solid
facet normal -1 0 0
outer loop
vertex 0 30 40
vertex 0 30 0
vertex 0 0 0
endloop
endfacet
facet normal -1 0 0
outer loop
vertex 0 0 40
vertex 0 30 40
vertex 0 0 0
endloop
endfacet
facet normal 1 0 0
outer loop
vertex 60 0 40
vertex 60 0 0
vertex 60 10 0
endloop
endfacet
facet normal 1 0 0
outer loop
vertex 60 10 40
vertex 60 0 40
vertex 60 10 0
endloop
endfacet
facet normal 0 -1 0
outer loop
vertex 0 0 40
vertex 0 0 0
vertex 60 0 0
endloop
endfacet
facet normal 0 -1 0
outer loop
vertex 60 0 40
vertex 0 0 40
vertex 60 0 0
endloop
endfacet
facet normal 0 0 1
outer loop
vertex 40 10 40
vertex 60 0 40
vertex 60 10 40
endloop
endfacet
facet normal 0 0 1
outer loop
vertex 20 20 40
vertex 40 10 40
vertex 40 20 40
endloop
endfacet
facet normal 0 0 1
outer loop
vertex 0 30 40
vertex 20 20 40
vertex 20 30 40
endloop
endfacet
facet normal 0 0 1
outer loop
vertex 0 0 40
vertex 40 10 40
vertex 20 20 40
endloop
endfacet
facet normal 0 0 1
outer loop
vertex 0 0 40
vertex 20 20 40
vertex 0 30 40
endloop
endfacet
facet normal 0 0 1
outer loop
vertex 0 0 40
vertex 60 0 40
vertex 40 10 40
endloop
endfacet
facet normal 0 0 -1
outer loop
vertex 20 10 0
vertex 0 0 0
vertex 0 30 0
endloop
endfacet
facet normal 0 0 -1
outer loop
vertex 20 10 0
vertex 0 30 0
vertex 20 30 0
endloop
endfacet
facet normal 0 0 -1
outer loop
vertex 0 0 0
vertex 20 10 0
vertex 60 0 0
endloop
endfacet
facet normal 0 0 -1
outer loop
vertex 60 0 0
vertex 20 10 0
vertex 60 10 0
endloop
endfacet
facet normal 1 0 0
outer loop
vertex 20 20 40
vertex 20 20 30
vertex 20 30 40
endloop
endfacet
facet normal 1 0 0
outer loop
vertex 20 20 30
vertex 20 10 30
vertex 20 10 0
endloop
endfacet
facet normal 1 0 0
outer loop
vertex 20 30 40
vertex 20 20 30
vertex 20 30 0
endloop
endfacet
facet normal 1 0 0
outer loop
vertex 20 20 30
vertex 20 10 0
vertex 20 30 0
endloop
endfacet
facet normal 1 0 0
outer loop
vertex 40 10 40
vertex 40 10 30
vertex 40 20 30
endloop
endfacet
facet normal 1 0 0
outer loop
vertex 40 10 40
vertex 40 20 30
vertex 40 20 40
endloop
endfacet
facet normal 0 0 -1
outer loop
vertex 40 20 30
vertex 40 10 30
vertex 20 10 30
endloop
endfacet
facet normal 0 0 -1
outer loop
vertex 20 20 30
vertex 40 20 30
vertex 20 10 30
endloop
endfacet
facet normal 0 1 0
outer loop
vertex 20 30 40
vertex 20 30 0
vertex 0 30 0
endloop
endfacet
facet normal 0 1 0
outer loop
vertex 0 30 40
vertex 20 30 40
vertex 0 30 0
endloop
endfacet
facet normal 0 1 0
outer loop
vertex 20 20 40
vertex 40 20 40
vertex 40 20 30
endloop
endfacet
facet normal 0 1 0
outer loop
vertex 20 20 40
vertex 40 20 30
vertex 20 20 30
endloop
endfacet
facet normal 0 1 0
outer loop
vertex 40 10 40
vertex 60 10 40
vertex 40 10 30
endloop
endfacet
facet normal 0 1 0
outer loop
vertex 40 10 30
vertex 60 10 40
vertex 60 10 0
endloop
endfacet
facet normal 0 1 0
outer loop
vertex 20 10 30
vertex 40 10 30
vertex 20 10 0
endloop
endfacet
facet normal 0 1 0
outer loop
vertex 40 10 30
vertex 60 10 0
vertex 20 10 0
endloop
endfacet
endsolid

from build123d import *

# Parameters (mm, degrees)
F1_DEPTH = 40
F2_W     = 20
F2_H     = 10
F3_DEPTH = 10


with BuildPart() as f1:
    # F0 (on Top) → F1 (new body)
    with BuildSketch(Plane.XY):
        Polygon((0, 30), (0, 0), (60, 0), (60, 10), (20, 10), (20, 30), align=None)
    extrude(amount=F1_DEPTH)

    # F2 (on face) → F3 (join)
    with BuildSketch(Plane(origin=(0, 10, 0), x_dir=(-1, 0, 0), z_dir=(0, 1, 0))):
        with Locations((-30, 35)):
            Rectangle(F2_W, F2_H)
    extrude(amount=F3_DEPTH)


solid = f1.part
